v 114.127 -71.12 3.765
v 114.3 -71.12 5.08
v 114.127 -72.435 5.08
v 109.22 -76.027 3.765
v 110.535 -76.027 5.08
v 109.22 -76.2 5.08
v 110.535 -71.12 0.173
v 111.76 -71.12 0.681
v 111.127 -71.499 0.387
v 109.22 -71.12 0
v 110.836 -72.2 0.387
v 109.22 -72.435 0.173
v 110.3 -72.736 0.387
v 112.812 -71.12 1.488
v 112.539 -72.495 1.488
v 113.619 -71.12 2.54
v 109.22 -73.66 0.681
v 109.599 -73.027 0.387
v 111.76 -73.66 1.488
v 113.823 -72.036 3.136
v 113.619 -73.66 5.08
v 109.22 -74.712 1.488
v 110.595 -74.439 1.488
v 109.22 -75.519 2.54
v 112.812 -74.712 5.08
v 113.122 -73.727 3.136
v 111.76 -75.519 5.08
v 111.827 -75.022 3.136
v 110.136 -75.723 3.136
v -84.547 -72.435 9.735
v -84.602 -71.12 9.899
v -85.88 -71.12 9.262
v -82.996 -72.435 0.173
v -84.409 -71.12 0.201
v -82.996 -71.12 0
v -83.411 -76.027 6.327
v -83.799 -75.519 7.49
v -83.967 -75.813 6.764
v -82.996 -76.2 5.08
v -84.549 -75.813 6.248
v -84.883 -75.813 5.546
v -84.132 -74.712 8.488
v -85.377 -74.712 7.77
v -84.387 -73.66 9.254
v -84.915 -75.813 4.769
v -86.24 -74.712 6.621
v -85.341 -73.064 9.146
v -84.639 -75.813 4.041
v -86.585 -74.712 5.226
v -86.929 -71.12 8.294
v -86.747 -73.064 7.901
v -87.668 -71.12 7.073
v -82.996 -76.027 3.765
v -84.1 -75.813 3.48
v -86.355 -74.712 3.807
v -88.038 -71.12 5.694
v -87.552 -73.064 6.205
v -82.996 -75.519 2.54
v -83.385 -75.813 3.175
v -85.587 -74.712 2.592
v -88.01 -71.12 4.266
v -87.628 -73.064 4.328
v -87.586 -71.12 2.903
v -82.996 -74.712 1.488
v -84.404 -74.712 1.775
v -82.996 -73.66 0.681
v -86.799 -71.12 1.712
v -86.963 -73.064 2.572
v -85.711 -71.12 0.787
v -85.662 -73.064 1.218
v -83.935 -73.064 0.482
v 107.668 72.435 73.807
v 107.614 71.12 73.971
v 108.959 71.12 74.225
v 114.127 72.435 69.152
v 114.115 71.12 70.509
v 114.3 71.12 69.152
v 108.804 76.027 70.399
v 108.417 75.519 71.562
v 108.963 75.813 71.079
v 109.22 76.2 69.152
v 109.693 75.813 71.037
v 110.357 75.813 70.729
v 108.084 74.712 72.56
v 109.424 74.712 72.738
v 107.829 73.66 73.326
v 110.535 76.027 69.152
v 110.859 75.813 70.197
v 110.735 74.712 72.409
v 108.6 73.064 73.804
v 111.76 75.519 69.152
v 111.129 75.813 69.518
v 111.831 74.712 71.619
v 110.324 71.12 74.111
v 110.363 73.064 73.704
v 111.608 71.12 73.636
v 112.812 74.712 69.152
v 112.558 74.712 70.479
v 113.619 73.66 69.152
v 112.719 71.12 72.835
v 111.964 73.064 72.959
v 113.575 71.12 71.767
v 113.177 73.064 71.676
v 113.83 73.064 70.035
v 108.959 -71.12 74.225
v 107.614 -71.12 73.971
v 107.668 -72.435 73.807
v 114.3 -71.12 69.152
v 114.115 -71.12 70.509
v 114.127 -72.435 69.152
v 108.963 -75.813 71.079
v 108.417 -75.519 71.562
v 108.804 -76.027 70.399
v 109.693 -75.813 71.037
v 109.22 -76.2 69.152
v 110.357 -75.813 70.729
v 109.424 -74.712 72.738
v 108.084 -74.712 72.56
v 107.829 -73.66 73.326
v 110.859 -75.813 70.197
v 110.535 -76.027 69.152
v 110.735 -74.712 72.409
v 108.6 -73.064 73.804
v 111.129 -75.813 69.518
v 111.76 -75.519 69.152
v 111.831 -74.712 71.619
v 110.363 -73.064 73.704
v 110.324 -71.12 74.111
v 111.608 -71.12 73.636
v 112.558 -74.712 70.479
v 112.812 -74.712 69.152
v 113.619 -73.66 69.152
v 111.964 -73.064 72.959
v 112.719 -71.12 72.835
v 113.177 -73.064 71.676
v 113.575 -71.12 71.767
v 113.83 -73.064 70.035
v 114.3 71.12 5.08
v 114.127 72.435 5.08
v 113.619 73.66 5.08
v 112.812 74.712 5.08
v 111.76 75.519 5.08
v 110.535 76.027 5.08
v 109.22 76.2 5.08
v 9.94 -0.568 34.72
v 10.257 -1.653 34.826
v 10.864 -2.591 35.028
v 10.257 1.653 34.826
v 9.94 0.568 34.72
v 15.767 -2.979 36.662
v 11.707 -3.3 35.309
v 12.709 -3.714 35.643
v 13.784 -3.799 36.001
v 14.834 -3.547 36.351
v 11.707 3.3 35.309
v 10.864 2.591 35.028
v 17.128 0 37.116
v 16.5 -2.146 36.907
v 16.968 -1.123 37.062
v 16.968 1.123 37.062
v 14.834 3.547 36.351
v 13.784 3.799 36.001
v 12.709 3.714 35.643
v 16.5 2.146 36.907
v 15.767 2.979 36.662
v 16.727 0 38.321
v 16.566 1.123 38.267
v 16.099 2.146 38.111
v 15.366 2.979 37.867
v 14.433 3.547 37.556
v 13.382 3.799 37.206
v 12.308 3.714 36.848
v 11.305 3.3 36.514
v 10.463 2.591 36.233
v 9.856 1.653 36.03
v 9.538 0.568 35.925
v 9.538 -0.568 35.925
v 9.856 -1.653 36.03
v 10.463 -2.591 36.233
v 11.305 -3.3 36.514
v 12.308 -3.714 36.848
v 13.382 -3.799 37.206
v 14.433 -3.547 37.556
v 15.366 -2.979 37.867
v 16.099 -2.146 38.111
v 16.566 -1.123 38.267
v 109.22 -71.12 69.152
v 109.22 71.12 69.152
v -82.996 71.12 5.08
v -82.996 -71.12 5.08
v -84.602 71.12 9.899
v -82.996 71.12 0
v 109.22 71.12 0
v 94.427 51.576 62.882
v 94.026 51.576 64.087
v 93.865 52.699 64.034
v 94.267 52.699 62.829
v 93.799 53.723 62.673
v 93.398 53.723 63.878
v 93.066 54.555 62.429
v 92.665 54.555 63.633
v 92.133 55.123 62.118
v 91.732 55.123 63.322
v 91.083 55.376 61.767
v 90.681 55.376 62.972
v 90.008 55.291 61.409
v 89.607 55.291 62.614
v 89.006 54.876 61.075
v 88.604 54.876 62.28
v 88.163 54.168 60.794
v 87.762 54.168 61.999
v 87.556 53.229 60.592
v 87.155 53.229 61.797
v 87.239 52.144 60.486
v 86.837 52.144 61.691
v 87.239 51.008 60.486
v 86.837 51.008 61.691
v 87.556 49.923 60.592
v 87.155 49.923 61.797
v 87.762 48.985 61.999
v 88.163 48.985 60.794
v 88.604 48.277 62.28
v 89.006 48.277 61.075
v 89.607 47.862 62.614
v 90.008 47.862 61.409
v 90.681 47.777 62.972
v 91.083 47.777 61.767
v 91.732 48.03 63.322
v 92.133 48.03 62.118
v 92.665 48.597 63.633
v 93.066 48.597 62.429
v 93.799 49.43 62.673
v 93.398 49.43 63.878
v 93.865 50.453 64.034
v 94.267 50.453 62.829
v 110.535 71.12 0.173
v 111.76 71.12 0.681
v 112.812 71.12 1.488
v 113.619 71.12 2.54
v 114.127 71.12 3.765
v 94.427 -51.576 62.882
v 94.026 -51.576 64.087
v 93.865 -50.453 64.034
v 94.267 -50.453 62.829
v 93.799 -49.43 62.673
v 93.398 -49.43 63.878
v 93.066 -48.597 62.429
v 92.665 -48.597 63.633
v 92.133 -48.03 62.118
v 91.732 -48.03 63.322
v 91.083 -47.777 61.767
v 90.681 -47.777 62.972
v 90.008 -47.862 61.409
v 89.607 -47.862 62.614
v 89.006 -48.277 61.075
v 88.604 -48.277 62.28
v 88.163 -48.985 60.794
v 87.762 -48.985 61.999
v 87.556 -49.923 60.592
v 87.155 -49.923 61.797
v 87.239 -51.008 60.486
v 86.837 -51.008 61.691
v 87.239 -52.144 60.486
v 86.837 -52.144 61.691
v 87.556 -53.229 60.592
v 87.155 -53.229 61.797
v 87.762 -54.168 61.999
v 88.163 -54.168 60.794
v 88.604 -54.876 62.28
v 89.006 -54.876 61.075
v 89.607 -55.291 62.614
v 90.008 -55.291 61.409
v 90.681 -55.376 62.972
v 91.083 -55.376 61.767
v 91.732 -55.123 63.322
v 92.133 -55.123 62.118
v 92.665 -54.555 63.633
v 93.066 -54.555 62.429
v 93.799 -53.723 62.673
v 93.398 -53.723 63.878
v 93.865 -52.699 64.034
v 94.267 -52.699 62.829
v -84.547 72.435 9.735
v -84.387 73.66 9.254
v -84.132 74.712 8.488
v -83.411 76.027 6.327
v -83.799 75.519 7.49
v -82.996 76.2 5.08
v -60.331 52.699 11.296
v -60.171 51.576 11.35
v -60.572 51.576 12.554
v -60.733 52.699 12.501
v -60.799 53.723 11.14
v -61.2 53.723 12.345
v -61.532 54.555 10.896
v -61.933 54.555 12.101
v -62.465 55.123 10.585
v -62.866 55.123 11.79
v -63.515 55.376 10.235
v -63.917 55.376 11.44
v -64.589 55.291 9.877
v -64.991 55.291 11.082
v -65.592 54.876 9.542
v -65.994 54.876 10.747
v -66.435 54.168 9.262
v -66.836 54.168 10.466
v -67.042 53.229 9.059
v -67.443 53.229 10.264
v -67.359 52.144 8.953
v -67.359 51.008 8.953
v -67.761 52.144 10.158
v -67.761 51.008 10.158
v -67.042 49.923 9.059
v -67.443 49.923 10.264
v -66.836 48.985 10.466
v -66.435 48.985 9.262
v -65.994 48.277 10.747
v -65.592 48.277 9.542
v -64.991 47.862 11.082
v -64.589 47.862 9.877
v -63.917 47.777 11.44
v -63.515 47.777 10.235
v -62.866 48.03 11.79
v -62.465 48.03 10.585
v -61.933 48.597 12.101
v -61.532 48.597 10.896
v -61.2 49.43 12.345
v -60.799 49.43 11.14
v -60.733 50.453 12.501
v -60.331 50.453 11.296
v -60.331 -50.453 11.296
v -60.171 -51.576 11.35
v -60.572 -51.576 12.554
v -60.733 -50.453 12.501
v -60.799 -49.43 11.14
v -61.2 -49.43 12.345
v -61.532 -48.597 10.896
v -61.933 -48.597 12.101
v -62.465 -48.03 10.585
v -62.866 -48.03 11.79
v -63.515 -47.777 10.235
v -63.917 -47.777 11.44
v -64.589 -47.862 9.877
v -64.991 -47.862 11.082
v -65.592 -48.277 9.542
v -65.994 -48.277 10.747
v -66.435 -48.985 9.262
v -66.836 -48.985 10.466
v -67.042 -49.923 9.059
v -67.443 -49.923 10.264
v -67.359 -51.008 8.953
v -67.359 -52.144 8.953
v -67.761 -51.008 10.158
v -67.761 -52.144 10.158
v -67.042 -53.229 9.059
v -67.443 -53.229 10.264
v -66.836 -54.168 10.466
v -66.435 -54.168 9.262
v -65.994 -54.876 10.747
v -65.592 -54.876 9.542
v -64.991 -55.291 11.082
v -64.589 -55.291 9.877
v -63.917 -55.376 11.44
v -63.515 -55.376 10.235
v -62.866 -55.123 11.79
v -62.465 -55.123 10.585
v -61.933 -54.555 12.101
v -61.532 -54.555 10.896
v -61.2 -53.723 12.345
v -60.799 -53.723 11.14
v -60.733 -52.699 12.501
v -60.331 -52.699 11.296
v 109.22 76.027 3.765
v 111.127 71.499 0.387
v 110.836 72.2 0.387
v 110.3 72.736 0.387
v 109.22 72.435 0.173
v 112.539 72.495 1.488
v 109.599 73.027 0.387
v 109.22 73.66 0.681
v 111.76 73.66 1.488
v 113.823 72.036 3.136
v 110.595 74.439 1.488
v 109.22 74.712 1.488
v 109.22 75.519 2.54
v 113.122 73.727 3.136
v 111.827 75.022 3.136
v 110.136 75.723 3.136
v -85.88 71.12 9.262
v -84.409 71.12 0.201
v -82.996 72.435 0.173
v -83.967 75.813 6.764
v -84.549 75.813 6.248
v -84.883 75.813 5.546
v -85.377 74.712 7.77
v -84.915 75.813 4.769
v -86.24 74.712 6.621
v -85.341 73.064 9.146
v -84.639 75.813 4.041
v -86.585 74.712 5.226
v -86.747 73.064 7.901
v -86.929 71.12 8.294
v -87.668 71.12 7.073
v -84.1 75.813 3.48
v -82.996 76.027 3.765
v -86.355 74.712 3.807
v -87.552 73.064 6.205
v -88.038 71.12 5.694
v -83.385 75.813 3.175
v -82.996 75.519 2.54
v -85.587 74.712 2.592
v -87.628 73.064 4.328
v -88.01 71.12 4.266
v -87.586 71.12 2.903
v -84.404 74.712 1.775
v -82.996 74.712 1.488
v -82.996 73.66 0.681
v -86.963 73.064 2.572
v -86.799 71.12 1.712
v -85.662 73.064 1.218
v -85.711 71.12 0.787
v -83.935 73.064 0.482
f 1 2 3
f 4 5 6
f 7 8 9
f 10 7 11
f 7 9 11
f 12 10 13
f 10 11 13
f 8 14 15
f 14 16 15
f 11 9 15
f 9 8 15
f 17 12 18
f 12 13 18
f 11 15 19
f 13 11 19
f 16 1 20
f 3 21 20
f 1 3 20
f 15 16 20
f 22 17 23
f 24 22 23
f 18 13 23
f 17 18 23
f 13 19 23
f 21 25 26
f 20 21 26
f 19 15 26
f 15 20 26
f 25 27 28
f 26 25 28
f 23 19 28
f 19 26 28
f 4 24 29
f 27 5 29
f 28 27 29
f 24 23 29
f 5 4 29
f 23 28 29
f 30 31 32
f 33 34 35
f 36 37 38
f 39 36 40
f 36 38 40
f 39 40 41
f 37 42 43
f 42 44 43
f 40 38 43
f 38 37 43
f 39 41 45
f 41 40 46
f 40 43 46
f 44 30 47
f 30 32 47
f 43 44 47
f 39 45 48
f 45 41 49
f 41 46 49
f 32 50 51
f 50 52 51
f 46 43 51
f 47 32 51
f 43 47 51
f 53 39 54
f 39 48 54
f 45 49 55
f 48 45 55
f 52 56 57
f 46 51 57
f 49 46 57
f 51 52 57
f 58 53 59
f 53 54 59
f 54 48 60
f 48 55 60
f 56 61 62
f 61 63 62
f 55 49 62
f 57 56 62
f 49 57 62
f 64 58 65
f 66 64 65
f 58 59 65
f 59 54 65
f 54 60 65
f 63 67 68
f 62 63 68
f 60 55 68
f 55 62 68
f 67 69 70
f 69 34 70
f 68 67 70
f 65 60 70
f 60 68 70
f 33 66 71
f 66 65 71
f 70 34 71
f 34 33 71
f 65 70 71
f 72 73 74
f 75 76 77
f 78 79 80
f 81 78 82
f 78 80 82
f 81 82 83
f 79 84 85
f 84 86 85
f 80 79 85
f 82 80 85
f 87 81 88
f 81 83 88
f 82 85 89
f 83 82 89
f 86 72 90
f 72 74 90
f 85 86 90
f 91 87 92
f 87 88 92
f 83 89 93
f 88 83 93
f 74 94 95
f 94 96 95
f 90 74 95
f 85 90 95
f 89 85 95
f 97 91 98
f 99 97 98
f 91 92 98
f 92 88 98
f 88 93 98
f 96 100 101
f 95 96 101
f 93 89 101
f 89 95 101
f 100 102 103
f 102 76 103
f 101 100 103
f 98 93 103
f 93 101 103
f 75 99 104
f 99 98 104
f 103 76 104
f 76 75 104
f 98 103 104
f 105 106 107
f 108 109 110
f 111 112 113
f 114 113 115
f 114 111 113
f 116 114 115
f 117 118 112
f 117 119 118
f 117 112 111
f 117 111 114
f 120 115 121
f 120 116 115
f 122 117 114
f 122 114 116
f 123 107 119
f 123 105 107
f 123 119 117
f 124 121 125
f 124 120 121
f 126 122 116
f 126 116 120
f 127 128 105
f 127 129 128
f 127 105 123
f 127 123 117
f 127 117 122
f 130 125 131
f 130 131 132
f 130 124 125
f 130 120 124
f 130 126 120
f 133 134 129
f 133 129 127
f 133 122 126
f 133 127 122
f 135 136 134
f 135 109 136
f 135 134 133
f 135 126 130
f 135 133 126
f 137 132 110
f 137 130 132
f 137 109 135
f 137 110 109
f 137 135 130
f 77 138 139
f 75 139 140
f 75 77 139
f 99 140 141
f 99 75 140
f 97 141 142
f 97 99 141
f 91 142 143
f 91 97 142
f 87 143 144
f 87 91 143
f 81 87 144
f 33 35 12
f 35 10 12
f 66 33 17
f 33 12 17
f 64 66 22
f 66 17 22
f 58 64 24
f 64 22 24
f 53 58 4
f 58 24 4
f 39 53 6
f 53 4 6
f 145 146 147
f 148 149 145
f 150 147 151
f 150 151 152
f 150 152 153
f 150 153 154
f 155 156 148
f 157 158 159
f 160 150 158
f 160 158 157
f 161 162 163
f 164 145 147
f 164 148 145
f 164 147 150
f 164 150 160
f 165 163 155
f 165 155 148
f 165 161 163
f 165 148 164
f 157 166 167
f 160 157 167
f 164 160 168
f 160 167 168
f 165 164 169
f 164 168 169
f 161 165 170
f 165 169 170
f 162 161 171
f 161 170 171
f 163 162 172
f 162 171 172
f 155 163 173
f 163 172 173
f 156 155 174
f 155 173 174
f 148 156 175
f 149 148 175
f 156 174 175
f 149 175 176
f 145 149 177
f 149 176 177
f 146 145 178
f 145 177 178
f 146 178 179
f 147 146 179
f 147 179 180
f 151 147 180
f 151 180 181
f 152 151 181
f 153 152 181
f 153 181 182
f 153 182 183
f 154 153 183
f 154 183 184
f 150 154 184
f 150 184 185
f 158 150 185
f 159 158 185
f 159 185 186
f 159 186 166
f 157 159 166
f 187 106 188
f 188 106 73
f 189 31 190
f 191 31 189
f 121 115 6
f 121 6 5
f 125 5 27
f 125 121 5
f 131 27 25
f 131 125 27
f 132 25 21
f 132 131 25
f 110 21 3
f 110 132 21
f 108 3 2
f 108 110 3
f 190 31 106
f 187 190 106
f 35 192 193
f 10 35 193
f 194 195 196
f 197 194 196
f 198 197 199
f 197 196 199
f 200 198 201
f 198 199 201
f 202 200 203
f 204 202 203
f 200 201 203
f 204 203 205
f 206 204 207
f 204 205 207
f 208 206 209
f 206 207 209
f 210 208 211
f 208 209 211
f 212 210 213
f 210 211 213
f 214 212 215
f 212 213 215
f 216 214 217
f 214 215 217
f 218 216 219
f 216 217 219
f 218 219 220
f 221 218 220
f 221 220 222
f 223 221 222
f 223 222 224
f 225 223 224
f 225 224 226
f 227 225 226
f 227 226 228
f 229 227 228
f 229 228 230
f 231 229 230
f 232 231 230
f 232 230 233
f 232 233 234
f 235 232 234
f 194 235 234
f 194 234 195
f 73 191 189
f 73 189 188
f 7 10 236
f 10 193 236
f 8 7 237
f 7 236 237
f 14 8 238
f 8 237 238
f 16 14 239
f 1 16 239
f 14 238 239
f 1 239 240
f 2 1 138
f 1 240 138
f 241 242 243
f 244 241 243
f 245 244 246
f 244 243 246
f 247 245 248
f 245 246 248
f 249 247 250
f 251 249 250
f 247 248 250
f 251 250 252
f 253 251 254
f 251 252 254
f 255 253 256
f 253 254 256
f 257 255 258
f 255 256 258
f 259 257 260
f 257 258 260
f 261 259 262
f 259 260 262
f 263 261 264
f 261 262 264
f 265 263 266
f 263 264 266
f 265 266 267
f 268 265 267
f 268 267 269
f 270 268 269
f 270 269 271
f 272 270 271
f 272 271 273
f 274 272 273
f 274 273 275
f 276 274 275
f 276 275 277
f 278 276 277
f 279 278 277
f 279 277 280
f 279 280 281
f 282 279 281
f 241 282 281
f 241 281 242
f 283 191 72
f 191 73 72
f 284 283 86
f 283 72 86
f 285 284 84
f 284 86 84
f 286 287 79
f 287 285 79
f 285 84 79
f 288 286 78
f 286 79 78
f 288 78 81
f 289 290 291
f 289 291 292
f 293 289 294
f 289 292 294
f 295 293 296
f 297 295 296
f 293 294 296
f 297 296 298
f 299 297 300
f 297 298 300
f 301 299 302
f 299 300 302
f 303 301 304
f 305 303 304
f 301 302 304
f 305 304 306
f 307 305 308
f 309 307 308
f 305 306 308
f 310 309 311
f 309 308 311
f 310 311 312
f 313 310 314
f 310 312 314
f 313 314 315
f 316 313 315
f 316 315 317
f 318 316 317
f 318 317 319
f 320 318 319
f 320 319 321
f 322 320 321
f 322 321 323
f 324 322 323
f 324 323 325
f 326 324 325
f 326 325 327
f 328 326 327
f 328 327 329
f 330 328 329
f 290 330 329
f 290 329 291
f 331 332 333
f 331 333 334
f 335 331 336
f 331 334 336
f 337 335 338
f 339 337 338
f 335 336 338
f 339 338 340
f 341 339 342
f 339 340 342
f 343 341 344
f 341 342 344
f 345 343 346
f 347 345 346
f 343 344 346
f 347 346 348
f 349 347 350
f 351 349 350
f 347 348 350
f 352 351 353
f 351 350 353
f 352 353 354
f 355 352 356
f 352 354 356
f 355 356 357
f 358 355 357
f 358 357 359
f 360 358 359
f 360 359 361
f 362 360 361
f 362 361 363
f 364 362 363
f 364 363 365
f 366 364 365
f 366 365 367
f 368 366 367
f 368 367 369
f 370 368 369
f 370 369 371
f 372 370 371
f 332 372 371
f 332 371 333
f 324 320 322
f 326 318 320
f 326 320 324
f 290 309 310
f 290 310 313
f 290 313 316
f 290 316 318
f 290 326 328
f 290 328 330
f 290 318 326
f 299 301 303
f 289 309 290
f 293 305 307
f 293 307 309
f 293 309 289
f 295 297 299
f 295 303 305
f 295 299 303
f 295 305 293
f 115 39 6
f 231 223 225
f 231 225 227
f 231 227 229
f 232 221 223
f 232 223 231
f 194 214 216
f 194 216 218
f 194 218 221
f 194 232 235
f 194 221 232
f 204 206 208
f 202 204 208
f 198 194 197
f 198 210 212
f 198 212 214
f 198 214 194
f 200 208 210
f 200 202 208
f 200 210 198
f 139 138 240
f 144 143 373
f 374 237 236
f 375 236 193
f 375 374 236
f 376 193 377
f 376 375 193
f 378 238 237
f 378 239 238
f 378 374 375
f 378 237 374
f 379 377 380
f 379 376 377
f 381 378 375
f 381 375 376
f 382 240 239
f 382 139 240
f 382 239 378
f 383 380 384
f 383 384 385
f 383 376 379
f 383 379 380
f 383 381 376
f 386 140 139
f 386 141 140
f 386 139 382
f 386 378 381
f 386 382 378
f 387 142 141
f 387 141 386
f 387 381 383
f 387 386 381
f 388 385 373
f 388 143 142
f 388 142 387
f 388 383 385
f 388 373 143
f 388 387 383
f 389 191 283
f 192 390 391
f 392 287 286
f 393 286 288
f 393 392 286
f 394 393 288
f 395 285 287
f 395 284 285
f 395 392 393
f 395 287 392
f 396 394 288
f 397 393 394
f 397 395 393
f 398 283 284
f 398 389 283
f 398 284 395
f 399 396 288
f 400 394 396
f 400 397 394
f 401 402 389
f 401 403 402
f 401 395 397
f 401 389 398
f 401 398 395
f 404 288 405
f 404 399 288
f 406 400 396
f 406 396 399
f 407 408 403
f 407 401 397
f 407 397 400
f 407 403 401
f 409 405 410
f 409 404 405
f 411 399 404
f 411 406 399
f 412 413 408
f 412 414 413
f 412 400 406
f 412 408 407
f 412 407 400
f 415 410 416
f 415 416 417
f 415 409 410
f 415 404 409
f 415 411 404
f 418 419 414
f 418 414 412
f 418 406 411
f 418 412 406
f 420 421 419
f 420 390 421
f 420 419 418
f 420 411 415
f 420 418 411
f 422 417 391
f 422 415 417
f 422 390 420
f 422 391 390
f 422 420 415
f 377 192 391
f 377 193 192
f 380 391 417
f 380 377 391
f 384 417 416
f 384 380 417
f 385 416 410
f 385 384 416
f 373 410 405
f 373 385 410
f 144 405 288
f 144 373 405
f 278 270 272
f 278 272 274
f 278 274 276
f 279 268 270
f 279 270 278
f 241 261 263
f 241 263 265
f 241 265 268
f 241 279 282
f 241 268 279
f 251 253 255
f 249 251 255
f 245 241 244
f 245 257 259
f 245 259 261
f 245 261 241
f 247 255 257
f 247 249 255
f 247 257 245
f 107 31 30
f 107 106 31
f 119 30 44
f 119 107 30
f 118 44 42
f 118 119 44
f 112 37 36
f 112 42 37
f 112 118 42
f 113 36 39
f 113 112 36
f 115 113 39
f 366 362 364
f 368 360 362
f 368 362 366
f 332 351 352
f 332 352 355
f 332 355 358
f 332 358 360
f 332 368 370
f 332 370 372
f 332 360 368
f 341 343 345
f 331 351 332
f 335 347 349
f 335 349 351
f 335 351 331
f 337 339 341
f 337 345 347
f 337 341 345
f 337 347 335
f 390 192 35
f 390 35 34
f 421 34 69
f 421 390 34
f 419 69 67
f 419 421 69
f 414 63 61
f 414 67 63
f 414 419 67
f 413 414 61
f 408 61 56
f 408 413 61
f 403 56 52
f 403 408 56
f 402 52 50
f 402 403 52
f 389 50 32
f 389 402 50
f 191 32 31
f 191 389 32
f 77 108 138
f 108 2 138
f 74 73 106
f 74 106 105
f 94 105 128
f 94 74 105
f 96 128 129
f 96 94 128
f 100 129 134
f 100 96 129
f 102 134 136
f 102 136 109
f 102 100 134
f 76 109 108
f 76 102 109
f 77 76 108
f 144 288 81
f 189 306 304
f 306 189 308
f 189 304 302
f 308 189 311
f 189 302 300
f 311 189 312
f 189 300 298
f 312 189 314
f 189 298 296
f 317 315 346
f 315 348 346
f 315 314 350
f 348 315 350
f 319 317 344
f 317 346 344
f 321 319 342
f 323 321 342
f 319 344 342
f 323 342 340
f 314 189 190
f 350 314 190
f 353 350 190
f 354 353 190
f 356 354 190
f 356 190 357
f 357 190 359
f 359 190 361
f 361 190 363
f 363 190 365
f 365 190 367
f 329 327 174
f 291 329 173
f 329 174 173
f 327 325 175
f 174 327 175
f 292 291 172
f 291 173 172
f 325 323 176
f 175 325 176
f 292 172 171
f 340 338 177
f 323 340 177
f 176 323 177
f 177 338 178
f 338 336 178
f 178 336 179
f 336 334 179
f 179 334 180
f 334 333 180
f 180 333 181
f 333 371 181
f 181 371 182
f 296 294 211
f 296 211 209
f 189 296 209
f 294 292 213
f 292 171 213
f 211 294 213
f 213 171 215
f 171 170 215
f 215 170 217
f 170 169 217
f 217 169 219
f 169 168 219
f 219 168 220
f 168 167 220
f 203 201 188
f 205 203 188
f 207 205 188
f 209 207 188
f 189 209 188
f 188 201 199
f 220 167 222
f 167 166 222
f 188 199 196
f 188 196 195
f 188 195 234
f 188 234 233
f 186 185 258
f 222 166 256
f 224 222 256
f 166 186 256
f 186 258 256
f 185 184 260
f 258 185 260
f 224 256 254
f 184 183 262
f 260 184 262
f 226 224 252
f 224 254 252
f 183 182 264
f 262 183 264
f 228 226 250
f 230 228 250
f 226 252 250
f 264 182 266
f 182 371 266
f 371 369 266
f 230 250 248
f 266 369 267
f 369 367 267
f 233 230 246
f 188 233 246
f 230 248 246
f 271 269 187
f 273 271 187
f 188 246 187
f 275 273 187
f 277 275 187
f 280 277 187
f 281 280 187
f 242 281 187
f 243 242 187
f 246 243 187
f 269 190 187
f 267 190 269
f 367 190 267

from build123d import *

# Parameters (mm, degrees)
F0_W     = 228.6
F0_H     = 152.4
F1_DEPTH = 76.2
F3_DEPTH = 152.4
F4_R     = 5.08
F5_R     = 3.81
F6_DEPTH = 6.35
F7_DEPTH = 5.08


with BuildPart() as f1:
    # F0 (on Top) → F1 (new body)
    with BuildSketch(Plane.XY):
        Rectangle(F0_W, F0_H)
    extrude(amount=F1_DEPTH)

    # F2 (on face) → F3 (cut)
    with BuildSketch(Plane.XZ.offset(76.2)):
        Polygon((-114.3, 76.2), (-114.3, 0), (114.3, 76.2), align=None)
    extrude(amount=-F3_DEPTH, mode=Mode.SUBTRACT)

    # F4
    f4_edges = [f1.edges().sort_by_distance(p)[0] for p in [
        (-114.3, 0, 0),
        (114.3, 0, 76.2),
        (0, -76.2, 38.1),
        (0, 76.2, 38.1),
        (114.3, -76.2, 38.1),
        (114.3, 76.2, 38.1),
        (114.3, 0, 0),
        (0, 76.2, 0),
        (0, -76.2, 0),
    ]]
    fillet(f4_edges, radius=F4_R)

    # F5 (on face) → F6 (cut)
    with BuildSketch(Plane(origin=(-11.43, 0, 34.29), x_dir=(0.9486832981, 0, 0.316227766), z_dir=(-0.316227766, 0, 0.9486832981))):
        with Locations((105.6566610932, -51.5762679279)):
            Circle(F5_R)
        with Locations((105.6566610932, 51.5762679279)):
            Circle(F5_R)
        with Locations((24.1764013898, 0)):
            Circle(F5_R)
        with Locations((-57.3038583136, 51.5762679279)):
            Circle(F5_R)
        with Locations((-57.3038583136, -51.5762679279)):
            Circle(F5_R)
    extrude(amount=-F6_DEPTH, mode=Mode.SUBTRACT)

    # F7 (cut): a face of the model
    f7_faces = [f1.faces().sort_by_distance(p)[0] for p in [
        (-82.2535384016, 0, 10.6821538661),
    ]]
    extrude(f7_faces, amount=-F7_DEPTH, mode=Mode.SUBTRACT)


solid = f1.part
